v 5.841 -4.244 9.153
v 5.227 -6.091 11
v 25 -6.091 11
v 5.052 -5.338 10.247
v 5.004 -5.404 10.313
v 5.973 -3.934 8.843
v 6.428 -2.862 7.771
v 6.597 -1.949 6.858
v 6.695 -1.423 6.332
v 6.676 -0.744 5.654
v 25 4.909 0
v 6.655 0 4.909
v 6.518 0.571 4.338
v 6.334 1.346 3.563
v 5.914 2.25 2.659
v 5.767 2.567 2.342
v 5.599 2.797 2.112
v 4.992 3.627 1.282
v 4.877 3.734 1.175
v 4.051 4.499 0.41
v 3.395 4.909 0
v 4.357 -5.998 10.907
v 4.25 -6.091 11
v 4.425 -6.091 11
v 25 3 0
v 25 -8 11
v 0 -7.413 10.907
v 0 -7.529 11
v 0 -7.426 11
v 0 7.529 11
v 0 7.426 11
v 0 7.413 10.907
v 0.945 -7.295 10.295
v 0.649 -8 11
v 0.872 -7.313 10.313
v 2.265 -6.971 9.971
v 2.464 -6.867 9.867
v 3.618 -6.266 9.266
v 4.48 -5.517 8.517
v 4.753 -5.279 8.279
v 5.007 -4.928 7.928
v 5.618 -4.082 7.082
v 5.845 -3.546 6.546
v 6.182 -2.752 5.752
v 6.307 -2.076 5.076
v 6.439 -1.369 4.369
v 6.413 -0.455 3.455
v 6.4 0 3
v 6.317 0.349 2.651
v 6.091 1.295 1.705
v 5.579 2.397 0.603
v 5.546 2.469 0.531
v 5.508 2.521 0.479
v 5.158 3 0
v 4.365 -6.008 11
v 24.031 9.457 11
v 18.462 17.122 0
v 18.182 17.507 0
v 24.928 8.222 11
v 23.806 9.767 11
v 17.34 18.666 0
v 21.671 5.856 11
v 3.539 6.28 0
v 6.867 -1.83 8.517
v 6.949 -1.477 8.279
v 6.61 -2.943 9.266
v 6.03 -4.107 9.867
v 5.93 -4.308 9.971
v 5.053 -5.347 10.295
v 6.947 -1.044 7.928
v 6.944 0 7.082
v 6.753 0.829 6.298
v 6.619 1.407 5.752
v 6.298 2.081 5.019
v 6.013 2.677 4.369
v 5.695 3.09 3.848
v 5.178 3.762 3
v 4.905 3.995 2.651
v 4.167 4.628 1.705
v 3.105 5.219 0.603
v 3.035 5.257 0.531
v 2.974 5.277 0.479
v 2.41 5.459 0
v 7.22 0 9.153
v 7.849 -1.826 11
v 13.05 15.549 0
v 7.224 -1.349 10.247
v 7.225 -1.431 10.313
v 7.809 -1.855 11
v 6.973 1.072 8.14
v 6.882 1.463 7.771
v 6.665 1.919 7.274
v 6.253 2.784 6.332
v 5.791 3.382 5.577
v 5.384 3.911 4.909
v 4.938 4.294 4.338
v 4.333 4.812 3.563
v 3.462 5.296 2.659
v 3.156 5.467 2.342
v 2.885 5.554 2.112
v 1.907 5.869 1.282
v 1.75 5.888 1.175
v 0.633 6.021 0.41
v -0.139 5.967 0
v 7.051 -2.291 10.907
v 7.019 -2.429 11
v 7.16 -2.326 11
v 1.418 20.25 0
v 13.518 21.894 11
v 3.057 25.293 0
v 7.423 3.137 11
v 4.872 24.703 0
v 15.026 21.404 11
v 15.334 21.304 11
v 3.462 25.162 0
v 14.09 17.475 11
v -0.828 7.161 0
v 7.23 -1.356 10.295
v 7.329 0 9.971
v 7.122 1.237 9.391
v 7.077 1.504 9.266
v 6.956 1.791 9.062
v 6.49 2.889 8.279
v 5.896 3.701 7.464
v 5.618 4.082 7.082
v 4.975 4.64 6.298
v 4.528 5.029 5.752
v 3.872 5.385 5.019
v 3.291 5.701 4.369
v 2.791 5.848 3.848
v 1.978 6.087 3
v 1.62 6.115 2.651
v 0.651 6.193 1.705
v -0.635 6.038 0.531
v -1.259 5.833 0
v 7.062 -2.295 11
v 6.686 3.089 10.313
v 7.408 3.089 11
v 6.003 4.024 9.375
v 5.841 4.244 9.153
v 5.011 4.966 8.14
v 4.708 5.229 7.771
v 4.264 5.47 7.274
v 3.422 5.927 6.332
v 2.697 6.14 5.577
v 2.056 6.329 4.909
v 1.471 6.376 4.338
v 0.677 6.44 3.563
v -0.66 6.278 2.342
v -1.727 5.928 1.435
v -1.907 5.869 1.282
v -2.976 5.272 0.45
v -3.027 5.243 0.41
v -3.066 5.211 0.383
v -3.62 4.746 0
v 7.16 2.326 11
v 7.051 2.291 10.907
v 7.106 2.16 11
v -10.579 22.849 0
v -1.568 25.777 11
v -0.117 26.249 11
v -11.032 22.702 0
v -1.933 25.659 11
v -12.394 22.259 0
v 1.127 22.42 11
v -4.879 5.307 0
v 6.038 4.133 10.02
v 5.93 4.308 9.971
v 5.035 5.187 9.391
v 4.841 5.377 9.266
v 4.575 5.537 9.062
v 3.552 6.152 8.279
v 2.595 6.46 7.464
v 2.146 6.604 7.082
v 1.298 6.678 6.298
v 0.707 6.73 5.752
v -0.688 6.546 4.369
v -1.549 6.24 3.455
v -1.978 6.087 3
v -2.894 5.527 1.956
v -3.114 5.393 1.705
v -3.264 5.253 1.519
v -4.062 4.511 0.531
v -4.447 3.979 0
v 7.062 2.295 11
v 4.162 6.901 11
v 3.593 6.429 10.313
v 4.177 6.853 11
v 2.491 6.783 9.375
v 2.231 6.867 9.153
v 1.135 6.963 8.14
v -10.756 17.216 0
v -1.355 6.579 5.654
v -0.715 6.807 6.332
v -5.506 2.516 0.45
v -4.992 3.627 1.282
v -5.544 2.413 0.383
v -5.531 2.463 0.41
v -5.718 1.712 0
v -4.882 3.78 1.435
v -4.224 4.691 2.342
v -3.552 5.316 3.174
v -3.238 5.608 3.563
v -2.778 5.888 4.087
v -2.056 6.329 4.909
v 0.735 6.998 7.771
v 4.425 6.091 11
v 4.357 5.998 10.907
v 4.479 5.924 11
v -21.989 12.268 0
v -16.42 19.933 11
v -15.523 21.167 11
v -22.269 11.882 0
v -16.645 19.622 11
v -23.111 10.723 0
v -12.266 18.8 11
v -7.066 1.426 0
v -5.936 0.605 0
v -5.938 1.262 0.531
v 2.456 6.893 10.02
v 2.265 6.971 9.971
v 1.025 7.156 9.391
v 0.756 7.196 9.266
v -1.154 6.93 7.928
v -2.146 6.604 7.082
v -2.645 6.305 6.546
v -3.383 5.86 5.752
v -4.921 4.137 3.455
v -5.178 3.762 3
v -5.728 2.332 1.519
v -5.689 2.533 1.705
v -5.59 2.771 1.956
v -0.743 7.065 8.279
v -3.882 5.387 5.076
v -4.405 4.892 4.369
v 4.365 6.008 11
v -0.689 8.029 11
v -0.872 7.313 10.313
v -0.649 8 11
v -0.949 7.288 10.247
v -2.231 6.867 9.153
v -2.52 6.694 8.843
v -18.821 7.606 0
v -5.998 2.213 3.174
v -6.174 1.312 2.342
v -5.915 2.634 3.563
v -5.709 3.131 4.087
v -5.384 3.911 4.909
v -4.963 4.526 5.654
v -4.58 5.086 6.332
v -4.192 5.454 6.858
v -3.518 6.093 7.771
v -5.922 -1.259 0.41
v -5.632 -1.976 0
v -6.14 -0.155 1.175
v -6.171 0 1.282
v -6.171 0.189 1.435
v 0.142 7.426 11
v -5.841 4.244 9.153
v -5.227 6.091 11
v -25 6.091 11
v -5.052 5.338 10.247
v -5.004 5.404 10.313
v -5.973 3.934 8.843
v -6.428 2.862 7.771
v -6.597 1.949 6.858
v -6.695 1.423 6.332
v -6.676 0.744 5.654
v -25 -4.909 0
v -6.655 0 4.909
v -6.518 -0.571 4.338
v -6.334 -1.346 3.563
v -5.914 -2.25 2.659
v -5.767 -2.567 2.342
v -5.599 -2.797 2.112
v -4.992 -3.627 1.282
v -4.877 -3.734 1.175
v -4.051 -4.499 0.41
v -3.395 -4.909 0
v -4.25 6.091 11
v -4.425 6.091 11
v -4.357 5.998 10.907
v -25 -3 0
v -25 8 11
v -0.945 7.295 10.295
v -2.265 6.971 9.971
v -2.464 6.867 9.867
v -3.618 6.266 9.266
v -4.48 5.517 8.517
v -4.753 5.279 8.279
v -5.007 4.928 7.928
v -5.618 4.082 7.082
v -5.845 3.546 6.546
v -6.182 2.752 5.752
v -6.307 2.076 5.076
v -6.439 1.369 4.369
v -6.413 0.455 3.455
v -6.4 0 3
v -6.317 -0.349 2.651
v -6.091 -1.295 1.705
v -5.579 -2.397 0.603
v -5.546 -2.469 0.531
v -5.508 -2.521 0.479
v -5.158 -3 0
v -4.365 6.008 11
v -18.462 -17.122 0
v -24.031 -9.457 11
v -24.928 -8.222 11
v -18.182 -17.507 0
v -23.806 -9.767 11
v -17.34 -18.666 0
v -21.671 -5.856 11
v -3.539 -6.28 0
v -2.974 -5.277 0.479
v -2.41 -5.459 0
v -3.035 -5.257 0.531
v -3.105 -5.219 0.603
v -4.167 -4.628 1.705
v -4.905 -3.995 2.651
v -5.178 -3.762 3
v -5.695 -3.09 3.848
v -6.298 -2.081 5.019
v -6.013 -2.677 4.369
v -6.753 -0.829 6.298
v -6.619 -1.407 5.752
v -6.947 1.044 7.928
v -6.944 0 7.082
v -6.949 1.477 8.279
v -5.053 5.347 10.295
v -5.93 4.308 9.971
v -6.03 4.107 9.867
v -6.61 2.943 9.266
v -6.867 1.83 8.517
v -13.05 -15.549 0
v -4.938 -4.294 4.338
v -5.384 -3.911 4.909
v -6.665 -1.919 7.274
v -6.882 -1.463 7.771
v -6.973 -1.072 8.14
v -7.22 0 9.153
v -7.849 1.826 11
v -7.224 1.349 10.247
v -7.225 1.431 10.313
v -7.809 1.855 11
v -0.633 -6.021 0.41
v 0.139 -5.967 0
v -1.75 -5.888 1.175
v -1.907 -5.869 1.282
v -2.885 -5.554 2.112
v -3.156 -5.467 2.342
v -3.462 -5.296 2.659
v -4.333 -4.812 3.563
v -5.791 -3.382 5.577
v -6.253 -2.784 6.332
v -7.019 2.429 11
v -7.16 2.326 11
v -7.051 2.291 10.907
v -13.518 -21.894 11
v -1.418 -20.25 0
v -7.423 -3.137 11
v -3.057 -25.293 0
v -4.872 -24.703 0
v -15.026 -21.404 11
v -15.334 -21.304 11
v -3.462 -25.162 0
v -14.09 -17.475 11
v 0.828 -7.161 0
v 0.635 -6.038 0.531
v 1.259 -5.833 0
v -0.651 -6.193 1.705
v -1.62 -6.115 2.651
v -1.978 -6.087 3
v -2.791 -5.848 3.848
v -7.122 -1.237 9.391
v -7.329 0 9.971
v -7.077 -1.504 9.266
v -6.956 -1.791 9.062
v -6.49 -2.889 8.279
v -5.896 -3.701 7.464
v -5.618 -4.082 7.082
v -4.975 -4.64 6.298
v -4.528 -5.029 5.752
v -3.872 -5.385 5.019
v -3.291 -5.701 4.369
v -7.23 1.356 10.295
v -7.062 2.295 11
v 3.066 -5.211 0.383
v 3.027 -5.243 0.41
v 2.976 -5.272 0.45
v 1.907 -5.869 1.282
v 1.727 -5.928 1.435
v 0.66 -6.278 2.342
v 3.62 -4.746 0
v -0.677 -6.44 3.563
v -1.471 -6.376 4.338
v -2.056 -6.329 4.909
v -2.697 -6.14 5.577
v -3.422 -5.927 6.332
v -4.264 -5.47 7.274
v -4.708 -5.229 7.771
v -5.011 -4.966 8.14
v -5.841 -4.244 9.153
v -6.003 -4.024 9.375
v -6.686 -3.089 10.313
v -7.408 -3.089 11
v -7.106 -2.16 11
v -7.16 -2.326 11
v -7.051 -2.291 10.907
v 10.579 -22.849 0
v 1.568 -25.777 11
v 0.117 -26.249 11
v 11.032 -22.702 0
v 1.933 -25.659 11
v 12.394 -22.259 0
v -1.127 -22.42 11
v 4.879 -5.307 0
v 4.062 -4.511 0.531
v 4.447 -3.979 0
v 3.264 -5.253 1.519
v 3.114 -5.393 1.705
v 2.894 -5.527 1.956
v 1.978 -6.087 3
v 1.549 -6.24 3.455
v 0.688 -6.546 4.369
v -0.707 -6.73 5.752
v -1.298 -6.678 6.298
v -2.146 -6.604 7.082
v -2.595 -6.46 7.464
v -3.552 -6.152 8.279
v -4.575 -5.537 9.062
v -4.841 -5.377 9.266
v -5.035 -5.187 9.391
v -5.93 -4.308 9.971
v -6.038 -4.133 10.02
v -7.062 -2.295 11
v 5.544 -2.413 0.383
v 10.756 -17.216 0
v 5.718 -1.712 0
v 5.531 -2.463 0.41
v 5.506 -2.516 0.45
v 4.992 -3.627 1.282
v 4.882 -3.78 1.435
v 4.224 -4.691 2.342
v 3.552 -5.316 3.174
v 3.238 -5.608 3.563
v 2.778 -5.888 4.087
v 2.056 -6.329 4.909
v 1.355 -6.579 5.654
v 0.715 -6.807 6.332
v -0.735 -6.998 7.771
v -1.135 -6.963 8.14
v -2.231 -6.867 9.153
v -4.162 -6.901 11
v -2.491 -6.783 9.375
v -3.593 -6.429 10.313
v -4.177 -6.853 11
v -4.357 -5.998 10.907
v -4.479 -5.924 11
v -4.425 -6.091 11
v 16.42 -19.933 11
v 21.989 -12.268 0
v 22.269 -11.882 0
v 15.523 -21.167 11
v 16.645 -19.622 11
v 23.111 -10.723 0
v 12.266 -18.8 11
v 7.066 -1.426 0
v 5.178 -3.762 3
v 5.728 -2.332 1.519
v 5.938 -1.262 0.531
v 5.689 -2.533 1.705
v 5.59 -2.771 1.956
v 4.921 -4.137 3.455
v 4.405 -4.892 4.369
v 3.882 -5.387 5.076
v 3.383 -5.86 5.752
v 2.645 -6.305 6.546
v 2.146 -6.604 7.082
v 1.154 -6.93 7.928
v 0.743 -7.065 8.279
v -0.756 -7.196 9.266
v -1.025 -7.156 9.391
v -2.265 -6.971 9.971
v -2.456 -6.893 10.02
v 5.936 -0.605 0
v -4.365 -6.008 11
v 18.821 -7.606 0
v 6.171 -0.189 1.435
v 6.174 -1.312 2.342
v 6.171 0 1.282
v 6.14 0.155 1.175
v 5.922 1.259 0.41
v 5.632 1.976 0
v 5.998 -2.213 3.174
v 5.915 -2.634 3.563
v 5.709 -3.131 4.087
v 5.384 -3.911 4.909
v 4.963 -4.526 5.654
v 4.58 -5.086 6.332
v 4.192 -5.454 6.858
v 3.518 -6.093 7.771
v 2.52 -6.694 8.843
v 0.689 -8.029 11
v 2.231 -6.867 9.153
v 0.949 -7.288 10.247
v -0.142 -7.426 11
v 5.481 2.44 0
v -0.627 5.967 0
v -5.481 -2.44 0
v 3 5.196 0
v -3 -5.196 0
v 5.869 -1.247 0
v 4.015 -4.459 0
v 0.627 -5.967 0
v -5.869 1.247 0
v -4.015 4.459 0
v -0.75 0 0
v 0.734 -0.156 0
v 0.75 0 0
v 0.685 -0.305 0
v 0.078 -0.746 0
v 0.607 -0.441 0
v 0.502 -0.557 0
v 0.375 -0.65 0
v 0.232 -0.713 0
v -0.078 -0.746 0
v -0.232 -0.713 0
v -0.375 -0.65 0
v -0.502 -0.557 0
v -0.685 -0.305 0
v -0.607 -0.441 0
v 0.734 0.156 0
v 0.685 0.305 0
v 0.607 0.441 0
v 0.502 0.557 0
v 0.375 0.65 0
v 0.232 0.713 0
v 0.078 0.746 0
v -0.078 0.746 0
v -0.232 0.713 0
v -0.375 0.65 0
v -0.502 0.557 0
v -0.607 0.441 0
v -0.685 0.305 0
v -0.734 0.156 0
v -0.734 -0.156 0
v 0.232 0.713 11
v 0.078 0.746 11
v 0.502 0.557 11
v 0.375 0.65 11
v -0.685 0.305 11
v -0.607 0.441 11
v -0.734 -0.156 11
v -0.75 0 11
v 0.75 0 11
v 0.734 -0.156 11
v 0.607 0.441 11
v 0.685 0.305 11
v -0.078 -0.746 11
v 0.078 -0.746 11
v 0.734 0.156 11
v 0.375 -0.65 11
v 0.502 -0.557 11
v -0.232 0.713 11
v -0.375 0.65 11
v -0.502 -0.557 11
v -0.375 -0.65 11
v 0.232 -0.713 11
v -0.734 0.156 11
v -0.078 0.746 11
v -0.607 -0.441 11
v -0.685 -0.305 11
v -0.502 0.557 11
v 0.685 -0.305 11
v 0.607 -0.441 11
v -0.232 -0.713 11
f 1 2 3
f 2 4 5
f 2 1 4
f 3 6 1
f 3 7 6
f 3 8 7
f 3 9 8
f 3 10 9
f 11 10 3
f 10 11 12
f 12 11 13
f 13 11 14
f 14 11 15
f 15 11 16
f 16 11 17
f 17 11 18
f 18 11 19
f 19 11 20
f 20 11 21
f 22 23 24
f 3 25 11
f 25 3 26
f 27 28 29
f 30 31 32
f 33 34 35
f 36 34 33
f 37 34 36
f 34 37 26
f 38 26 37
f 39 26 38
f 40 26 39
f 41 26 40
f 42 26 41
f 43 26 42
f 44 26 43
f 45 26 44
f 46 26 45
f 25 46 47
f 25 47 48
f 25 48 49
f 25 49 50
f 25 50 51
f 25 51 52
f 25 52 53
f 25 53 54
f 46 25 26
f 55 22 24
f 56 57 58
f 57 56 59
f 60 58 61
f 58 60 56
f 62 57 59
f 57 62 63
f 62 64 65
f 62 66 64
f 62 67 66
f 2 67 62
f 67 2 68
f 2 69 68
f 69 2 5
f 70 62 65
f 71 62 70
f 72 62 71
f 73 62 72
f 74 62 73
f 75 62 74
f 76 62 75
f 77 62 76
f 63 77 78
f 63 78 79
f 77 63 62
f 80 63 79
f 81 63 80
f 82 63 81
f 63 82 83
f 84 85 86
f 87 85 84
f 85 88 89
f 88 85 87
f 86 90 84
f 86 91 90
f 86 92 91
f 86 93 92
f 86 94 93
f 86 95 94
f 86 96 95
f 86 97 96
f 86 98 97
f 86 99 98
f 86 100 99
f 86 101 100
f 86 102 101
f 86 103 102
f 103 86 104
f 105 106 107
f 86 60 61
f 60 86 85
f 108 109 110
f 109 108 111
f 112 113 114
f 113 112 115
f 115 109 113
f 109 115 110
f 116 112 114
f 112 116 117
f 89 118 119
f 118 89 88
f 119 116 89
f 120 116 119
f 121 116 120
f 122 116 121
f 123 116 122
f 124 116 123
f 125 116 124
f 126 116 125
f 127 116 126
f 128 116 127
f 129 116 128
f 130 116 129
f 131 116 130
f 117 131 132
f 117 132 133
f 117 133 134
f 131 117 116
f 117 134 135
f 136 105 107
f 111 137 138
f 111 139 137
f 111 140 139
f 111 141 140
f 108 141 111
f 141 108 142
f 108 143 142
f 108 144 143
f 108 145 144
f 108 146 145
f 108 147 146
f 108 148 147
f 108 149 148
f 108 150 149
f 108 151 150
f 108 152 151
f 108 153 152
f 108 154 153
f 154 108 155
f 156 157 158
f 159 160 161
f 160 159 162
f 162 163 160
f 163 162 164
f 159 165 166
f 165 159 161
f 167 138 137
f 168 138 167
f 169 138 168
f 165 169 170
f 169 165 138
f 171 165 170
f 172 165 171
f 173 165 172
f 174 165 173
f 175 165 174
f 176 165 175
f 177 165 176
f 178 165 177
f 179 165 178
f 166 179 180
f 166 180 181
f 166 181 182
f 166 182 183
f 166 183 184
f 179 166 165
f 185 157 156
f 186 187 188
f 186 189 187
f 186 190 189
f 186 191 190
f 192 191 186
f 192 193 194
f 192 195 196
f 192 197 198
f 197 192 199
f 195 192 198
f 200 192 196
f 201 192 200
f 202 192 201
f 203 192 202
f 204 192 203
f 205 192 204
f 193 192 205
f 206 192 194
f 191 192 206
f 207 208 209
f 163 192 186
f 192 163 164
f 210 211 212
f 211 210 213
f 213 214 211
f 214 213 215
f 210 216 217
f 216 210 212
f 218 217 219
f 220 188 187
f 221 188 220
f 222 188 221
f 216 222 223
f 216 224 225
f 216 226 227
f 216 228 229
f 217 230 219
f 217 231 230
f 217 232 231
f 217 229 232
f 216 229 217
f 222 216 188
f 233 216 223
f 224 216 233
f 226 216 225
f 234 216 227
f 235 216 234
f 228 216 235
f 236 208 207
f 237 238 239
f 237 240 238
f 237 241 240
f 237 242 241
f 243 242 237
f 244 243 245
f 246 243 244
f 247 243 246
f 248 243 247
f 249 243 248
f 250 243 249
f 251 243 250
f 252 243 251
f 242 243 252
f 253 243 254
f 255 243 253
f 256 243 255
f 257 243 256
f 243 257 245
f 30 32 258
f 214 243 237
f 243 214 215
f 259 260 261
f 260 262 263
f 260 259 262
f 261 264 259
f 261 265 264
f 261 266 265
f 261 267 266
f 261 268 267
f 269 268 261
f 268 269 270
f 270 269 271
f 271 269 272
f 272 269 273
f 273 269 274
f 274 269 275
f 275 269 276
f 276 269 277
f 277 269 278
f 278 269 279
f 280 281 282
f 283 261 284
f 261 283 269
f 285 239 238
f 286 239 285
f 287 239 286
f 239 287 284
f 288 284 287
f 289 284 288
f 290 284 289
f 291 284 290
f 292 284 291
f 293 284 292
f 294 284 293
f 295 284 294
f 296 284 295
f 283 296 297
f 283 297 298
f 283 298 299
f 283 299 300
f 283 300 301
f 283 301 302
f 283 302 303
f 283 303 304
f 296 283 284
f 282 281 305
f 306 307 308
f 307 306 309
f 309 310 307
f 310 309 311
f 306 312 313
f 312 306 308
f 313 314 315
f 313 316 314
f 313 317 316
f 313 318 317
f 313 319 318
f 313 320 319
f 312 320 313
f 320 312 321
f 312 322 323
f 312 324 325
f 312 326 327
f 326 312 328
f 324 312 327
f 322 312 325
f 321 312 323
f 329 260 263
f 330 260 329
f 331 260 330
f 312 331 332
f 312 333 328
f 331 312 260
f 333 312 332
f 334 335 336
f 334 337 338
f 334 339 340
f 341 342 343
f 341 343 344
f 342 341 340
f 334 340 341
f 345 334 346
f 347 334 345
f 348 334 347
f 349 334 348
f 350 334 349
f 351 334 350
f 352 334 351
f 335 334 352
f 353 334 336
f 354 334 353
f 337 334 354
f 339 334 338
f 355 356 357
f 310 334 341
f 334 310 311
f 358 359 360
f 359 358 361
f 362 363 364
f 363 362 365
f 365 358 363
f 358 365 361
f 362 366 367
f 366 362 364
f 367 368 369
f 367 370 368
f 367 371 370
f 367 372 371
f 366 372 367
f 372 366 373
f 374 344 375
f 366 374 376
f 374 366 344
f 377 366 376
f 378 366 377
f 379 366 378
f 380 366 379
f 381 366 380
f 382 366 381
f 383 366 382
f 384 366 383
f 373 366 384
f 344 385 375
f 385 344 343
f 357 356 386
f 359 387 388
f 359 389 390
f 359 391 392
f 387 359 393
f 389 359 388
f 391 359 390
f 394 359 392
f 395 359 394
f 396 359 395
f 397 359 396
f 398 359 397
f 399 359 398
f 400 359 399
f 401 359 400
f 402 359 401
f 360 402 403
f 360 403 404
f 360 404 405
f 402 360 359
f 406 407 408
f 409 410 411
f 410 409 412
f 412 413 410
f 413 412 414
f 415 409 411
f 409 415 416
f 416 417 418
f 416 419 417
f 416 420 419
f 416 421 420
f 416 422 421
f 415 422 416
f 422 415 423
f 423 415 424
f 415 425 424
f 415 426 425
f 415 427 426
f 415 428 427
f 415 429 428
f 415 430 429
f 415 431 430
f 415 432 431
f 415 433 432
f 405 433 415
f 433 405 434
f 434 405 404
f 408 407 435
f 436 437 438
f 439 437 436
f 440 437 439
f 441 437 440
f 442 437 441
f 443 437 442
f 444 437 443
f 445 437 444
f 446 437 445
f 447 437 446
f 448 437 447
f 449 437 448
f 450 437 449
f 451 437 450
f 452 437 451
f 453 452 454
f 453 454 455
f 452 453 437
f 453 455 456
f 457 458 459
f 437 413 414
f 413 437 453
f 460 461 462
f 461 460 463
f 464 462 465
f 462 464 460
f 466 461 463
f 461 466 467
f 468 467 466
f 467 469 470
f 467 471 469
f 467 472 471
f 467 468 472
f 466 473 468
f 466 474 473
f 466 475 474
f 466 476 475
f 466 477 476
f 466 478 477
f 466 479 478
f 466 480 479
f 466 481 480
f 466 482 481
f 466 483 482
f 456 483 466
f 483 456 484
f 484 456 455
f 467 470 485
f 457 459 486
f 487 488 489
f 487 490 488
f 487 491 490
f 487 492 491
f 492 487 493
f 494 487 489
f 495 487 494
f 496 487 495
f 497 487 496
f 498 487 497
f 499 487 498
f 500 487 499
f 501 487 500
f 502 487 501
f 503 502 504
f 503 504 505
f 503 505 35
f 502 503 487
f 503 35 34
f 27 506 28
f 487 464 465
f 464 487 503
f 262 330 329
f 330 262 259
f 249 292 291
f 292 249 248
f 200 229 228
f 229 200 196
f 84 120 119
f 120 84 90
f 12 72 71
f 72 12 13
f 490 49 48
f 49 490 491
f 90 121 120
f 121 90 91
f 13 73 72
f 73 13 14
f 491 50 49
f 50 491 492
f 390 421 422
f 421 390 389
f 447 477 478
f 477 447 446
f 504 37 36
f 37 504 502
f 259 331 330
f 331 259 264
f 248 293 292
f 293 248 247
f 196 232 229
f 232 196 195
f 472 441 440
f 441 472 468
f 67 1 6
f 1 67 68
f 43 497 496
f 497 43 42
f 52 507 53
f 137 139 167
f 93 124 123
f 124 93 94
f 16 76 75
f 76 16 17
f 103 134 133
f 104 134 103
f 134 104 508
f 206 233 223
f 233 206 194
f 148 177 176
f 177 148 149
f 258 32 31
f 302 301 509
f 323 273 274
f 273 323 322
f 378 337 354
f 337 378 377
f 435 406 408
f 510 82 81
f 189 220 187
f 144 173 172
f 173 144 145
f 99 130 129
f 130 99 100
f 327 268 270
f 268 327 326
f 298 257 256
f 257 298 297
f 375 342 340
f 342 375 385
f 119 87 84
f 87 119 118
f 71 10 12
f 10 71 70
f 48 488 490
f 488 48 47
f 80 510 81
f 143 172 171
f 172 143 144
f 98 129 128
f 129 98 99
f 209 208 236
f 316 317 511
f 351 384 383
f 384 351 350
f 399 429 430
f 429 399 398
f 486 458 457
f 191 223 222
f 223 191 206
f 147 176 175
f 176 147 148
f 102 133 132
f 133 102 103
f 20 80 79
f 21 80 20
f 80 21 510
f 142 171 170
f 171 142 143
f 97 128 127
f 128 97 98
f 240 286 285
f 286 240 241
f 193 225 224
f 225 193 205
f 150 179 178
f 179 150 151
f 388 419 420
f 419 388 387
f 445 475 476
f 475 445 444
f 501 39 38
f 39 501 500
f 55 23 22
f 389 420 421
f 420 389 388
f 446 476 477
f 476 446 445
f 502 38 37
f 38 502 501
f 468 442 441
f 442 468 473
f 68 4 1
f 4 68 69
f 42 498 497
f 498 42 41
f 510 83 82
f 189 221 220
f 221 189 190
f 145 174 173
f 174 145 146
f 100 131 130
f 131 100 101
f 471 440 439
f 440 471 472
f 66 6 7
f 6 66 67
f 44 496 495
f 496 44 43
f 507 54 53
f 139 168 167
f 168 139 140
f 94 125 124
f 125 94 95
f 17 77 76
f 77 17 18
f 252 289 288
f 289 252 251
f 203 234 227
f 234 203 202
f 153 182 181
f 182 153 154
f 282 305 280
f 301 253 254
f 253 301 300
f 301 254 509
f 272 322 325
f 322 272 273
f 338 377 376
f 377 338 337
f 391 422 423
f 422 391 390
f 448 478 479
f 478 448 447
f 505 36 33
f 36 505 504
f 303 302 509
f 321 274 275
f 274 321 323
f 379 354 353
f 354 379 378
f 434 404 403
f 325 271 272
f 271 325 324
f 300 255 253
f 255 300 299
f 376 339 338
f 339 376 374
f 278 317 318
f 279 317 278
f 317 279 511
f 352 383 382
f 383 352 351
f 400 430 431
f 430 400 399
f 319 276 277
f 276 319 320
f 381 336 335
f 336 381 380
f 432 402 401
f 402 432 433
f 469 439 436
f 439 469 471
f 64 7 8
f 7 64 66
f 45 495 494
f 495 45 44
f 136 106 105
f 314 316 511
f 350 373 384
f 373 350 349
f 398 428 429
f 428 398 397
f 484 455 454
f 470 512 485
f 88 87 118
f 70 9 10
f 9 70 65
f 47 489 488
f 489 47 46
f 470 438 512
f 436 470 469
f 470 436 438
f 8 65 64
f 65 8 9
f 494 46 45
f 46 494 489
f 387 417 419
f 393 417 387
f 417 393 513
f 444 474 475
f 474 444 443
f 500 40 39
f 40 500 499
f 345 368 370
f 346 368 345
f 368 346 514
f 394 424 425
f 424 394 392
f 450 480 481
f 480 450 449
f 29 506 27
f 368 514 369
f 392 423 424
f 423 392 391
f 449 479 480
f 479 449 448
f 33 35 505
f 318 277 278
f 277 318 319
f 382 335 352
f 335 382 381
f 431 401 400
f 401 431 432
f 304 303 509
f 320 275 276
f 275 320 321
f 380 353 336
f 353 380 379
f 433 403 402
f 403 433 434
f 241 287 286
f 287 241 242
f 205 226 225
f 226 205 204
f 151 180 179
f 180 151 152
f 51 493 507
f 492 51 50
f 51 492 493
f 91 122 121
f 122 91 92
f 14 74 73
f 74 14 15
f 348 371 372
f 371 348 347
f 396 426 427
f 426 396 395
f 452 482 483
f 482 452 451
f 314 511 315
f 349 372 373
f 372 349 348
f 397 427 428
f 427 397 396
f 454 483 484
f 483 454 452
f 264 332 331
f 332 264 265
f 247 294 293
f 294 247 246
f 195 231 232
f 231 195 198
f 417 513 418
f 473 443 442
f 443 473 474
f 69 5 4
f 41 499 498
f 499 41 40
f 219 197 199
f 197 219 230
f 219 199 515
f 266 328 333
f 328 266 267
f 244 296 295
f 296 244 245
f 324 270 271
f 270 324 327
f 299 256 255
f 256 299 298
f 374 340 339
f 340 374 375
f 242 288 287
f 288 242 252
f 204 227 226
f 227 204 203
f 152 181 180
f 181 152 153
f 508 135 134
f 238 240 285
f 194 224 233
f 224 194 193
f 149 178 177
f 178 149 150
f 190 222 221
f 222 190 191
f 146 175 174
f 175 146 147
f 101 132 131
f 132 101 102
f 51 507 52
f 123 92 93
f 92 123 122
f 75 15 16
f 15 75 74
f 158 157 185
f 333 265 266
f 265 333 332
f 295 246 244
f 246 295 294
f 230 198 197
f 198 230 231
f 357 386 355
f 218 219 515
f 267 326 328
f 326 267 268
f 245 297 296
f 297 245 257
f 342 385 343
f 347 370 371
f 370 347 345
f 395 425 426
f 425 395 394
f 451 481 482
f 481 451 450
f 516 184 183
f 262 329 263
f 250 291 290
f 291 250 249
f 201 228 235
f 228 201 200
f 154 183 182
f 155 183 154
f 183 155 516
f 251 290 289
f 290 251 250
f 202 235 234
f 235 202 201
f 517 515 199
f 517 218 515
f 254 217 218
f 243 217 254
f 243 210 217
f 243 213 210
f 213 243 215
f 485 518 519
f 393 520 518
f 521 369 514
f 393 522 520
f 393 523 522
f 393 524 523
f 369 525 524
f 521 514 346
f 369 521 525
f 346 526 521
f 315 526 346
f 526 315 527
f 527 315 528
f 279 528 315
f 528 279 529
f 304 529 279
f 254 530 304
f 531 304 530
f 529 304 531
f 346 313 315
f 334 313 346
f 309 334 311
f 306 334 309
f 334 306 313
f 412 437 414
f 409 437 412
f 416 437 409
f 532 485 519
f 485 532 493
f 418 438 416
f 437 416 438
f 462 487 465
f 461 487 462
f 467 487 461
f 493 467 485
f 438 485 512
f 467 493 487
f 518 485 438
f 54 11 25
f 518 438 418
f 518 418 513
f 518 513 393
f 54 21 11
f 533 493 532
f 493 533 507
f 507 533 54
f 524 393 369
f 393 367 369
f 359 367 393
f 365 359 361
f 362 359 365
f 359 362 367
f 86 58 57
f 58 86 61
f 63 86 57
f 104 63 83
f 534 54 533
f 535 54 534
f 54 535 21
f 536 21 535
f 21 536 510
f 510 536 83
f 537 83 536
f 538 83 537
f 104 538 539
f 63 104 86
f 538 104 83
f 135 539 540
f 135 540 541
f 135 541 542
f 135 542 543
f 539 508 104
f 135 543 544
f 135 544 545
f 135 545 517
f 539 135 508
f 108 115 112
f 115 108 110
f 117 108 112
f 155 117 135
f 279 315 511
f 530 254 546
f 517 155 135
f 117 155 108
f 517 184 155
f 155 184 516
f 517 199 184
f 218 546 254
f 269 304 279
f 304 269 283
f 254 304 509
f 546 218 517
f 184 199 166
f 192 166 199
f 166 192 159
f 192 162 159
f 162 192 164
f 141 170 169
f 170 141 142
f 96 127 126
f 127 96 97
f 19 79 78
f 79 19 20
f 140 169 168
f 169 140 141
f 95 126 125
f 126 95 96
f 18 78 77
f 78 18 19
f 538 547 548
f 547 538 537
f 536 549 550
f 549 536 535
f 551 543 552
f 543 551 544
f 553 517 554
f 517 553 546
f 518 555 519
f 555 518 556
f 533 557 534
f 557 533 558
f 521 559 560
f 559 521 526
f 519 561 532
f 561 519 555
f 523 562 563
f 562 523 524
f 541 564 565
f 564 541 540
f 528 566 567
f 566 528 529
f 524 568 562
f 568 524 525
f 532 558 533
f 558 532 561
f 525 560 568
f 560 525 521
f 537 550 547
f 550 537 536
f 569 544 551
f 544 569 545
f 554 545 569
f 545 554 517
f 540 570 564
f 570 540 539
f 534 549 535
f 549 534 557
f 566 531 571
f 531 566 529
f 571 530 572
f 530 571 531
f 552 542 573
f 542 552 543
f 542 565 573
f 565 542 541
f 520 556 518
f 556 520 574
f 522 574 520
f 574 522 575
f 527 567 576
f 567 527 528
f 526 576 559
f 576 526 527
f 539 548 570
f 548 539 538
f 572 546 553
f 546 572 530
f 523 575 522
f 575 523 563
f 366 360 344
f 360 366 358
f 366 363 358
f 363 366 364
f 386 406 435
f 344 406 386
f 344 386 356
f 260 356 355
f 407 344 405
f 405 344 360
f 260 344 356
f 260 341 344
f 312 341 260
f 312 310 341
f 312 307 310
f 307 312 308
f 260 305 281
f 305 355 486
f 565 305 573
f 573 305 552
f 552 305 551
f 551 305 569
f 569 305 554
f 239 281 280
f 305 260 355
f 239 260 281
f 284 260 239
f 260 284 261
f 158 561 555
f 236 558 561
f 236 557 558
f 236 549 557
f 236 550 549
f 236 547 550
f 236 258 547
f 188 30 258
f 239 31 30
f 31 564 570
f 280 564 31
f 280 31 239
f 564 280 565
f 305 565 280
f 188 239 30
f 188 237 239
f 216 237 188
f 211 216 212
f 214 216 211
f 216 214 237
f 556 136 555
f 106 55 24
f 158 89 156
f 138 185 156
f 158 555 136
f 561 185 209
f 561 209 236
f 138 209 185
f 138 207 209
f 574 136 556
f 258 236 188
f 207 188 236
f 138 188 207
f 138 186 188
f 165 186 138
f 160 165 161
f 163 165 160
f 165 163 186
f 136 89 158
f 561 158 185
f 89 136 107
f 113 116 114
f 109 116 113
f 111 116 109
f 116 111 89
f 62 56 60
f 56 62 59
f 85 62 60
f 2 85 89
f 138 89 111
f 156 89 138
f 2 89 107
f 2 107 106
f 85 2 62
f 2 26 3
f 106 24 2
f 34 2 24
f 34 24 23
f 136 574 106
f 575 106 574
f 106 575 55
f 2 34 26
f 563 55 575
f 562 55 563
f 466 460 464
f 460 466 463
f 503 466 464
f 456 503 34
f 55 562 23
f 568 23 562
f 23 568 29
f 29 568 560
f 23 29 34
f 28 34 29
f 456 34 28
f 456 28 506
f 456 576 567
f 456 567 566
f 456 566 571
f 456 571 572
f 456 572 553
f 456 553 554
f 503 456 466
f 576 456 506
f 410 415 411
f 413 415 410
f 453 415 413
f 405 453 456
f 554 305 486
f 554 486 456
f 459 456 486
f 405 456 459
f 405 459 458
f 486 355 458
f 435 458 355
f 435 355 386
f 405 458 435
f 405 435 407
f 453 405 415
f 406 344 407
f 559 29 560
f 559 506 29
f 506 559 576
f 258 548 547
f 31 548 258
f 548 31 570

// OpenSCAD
// preview[view:north east, tilt:top diagonal]

// How many blades?
blades = 10; // [1:1:75]

// Length of blades
length = 25; // [1:1:300]

// Depth of propeller
depth = 12; // [1:1:75]

// How thick shall the blades be?
t = 1.35; // [0.1:0.1:7]

// Center hole for the shaft
shaft = 1.5; // [0:0.1:20]

// Do you want one flat side in the shaft hole?
cut = 0; // [1:Yes,0:No]

/* [Hidden] */
angle = 45;

difference() {   
    ///////////////////////
    // Draw these things //
    ///////////////////////
    union(){
        for (rotation =[0:360/blades:360]) {
            rotate([0,0,rotation]) {
                translate([0,8,-5]) {
                    rotate([angle,0,0]) {
                        // Draw blades
                        cube([length, t, depth/sin(angle)+10],false);
                    } // End rotate
                } // End translate       
            } // End rotate
        } // End for spaceW

    if (depth>20) {
        // Draw center cylinder for deep propellers
        cylinder(h=depth, r1=depth/4, r2=depth/3, center=false, $fn=40);
        } else {
        // Draw center cylinder for shallow propellers
        cylinder(h=depth, r1=6, r2=7.6, center=false, $fn=30); 
        } // End else
    } // End union

    ///////////////////////////
    // Cut away these things //
    ///////////////////////////

    // Draw shaft hole
    translate([0,0,-1]) {
        cylinder(h=depth+1, r1=shaft/2, r2=shaft/2, center=false, $fn=30);
    } // End translate

    // Cut away bottom
    translate([0,0,-5]) {
        cube([1000, 1000, 10],true);
    } // End translate

    // Cut away top
    translate([-500,-500,depth-1]) {
        cube([1000, 1000, 10],false);
    } // End translate

} // End difference

// Draw extra part in shaft hole if cut is choosen
if (cut==1) {
    translate([shaft/3,-shaft/2,0]) {
        cube([shaft/3, shaft, depth-1],false);
    } // End translate
} // End if cut
